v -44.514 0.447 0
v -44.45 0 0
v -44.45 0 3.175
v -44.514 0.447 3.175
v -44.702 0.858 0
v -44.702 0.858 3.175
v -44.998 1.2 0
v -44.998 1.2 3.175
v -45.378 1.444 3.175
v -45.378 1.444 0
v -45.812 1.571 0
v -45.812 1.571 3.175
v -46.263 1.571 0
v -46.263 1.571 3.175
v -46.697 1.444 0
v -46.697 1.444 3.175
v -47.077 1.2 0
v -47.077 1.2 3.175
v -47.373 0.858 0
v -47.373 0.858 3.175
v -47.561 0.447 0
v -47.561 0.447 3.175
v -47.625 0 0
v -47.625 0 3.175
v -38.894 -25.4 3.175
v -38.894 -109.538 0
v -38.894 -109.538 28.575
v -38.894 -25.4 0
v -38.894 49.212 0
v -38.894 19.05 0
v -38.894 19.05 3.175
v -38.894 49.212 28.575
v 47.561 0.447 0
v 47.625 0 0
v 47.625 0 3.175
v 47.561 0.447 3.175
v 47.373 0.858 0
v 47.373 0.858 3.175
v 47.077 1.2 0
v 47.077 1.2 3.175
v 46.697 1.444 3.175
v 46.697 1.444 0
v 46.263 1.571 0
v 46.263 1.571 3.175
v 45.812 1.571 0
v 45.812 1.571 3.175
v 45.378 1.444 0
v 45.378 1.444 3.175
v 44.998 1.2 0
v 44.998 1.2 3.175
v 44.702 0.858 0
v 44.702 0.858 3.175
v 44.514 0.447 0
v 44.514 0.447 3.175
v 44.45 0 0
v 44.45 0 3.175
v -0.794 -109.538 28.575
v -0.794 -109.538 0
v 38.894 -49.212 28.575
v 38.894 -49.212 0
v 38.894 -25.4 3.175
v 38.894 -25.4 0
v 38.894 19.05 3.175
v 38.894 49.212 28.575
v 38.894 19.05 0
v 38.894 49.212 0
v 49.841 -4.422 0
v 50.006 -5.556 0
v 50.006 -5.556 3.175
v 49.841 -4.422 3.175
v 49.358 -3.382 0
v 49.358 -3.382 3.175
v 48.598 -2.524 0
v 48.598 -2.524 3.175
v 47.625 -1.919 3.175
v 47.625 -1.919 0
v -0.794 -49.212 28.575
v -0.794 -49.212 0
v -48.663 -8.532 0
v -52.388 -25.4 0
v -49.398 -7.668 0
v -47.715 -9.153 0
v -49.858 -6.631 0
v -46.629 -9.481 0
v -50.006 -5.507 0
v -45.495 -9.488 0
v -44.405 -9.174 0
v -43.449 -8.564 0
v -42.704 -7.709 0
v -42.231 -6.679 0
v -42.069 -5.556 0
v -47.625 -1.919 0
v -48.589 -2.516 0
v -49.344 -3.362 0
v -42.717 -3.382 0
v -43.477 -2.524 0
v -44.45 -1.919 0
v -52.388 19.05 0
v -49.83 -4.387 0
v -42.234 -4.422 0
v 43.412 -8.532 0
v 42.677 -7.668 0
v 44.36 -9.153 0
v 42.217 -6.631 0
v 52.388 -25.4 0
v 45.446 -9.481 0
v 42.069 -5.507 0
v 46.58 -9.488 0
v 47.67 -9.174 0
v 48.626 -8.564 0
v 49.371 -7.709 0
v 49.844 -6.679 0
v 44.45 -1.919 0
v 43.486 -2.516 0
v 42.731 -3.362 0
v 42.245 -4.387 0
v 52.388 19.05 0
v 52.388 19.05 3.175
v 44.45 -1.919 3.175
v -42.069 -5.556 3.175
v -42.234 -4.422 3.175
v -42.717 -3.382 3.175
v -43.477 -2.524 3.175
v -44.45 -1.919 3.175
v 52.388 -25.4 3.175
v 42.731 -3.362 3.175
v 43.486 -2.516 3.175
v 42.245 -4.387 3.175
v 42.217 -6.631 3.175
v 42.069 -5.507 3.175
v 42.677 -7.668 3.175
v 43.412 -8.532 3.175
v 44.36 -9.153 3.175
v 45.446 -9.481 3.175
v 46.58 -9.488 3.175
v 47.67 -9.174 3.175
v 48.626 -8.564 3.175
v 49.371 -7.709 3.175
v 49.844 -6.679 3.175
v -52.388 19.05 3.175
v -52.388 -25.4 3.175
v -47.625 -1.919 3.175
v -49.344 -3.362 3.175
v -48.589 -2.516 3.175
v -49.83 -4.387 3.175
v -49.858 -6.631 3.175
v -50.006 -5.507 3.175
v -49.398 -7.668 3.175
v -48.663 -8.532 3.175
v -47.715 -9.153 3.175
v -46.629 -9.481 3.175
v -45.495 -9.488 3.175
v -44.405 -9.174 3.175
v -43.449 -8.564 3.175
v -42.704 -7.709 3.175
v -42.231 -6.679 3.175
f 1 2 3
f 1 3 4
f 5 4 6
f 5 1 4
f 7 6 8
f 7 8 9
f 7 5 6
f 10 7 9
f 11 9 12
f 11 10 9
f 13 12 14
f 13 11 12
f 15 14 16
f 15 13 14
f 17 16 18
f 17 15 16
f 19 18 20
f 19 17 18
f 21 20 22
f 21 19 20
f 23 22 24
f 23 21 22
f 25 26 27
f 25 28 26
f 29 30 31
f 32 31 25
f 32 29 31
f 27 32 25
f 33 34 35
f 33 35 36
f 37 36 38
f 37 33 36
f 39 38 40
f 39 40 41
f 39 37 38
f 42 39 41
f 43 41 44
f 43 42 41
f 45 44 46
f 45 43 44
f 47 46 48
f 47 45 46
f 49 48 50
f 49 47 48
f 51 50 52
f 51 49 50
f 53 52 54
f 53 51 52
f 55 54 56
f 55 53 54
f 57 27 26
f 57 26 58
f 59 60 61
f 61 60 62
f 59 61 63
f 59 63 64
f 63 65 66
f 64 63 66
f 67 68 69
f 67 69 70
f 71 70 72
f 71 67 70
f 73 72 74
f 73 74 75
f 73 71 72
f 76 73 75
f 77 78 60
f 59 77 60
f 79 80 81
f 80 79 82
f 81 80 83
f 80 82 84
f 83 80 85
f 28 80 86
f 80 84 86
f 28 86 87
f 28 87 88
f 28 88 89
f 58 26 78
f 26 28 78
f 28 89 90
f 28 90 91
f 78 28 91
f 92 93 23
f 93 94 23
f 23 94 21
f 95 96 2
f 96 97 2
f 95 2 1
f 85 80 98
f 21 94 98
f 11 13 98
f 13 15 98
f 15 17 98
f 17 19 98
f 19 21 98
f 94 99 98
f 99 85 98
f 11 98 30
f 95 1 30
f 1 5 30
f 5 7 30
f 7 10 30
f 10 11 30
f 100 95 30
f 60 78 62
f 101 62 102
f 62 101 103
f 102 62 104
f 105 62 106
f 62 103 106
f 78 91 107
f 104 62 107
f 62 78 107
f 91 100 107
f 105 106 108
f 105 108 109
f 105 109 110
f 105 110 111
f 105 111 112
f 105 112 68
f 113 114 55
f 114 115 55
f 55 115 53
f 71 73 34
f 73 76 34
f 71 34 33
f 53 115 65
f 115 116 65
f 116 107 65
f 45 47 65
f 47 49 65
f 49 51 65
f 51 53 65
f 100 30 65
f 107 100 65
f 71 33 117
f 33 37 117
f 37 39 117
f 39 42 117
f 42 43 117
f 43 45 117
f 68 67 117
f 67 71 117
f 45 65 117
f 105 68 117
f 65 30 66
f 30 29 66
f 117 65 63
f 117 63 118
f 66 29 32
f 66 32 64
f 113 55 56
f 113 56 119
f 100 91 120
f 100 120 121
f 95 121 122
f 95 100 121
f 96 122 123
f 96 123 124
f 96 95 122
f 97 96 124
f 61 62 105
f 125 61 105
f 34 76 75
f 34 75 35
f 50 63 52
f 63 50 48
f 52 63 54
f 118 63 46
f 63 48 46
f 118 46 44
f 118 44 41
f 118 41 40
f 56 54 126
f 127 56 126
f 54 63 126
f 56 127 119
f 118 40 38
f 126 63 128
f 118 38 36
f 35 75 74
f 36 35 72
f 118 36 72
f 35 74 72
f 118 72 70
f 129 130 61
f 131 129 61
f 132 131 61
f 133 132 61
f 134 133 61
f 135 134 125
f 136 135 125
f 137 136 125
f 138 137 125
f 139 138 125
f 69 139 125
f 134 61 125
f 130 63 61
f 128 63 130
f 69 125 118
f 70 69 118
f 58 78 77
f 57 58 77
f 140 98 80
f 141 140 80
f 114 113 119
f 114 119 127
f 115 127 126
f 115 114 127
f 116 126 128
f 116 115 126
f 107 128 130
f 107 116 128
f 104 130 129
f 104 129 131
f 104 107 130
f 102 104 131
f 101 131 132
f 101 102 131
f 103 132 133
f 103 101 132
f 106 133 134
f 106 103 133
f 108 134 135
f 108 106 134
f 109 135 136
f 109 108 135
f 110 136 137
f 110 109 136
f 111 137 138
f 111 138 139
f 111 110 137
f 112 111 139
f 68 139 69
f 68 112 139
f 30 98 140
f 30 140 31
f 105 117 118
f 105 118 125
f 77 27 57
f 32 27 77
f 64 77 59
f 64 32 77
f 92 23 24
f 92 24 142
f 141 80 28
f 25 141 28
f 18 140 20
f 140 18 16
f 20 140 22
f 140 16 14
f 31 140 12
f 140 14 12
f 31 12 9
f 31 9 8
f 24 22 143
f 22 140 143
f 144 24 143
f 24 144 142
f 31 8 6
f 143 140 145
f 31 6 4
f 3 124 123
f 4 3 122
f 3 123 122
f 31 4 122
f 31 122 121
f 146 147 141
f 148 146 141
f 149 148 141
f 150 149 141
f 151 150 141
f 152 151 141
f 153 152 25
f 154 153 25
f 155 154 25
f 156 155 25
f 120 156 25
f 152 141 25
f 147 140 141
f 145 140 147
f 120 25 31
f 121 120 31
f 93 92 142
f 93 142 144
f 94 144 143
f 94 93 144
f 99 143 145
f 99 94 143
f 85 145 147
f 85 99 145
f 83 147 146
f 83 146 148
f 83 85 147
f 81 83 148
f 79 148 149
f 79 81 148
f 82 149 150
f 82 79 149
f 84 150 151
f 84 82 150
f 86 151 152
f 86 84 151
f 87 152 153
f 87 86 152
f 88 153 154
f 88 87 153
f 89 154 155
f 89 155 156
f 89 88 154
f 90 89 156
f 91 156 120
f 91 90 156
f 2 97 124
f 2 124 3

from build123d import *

# Parameters (mm, degrees)
F0_W     = 77.7875
F0_H     = 98.425
F1_DEPTH = 28.575
F2_W     = 104.775
F2_H     = 44.45
F3_DEPTH = 3.175
F4_W     = 38.1
F4_H     = 28.575
F5_DEPTH = 60.325


with BuildPart() as f1:
    # F0 (on Top) → F1 (new body)
    with BuildSketch(Plane.XY):
        Rectangle(F0_W, F0_H)
    extrude(amount=F1_DEPTH)

    # F2 (on face) → F3 (join)
    with BuildSketch(Plane(origin=(0, 0, 0), x_dir=(1, 0, 0), z_dir=(0, 0, -1))):
        with Locations((0, 3.175)):
            Rectangle(F2_W, F2_H)
        with BuildLine():
            ThreePointArc((-47.625, 1.918831), (-48.211274, 8.876744), (-42.06875, 5.55625))
            ThreePointArc((-42.06875, 5.55625), (-42.717006, 3.382476), (-44.45, 1.918831))
            Line((-44.45, 1.918831), (-44.45, 0))
            ThreePointArc((-44.45, 0), (-46.0375, -1.5875), (-47.625, 0))
            Line((-47.625, 0), (-47.625, 1.918831))
        make_face(mode=Mode.SUBTRACT)
        with BuildLine():
            ThreePointArc((44.45, 1.918831), (43.863726, 8.876744), (50.00625, 5.55625))
            ThreePointArc((50.00625, 5.55625), (49.357994, 3.382476), (47.625, 1.918831))
            Line((47.625, 1.918831), (47.625, 0))
            ThreePointArc((47.625, 0), (46.0375, -1.5875), (44.45, 0))
            Line((44.45, 0), (44.45, 1.918831))
        make_face(mode=Mode.SUBTRACT)
    extrude(amount=-F3_DEPTH)

    # F4 (on face) → F5 (join)
    with BuildSketch(Plane.XZ.offset(49.2125)):
        with Locations((-19.84375, 14.2875)):
            Rectangle(F4_W, F4_H)
    extrude(amount=F5_DEPTH)


solid = f1.part
